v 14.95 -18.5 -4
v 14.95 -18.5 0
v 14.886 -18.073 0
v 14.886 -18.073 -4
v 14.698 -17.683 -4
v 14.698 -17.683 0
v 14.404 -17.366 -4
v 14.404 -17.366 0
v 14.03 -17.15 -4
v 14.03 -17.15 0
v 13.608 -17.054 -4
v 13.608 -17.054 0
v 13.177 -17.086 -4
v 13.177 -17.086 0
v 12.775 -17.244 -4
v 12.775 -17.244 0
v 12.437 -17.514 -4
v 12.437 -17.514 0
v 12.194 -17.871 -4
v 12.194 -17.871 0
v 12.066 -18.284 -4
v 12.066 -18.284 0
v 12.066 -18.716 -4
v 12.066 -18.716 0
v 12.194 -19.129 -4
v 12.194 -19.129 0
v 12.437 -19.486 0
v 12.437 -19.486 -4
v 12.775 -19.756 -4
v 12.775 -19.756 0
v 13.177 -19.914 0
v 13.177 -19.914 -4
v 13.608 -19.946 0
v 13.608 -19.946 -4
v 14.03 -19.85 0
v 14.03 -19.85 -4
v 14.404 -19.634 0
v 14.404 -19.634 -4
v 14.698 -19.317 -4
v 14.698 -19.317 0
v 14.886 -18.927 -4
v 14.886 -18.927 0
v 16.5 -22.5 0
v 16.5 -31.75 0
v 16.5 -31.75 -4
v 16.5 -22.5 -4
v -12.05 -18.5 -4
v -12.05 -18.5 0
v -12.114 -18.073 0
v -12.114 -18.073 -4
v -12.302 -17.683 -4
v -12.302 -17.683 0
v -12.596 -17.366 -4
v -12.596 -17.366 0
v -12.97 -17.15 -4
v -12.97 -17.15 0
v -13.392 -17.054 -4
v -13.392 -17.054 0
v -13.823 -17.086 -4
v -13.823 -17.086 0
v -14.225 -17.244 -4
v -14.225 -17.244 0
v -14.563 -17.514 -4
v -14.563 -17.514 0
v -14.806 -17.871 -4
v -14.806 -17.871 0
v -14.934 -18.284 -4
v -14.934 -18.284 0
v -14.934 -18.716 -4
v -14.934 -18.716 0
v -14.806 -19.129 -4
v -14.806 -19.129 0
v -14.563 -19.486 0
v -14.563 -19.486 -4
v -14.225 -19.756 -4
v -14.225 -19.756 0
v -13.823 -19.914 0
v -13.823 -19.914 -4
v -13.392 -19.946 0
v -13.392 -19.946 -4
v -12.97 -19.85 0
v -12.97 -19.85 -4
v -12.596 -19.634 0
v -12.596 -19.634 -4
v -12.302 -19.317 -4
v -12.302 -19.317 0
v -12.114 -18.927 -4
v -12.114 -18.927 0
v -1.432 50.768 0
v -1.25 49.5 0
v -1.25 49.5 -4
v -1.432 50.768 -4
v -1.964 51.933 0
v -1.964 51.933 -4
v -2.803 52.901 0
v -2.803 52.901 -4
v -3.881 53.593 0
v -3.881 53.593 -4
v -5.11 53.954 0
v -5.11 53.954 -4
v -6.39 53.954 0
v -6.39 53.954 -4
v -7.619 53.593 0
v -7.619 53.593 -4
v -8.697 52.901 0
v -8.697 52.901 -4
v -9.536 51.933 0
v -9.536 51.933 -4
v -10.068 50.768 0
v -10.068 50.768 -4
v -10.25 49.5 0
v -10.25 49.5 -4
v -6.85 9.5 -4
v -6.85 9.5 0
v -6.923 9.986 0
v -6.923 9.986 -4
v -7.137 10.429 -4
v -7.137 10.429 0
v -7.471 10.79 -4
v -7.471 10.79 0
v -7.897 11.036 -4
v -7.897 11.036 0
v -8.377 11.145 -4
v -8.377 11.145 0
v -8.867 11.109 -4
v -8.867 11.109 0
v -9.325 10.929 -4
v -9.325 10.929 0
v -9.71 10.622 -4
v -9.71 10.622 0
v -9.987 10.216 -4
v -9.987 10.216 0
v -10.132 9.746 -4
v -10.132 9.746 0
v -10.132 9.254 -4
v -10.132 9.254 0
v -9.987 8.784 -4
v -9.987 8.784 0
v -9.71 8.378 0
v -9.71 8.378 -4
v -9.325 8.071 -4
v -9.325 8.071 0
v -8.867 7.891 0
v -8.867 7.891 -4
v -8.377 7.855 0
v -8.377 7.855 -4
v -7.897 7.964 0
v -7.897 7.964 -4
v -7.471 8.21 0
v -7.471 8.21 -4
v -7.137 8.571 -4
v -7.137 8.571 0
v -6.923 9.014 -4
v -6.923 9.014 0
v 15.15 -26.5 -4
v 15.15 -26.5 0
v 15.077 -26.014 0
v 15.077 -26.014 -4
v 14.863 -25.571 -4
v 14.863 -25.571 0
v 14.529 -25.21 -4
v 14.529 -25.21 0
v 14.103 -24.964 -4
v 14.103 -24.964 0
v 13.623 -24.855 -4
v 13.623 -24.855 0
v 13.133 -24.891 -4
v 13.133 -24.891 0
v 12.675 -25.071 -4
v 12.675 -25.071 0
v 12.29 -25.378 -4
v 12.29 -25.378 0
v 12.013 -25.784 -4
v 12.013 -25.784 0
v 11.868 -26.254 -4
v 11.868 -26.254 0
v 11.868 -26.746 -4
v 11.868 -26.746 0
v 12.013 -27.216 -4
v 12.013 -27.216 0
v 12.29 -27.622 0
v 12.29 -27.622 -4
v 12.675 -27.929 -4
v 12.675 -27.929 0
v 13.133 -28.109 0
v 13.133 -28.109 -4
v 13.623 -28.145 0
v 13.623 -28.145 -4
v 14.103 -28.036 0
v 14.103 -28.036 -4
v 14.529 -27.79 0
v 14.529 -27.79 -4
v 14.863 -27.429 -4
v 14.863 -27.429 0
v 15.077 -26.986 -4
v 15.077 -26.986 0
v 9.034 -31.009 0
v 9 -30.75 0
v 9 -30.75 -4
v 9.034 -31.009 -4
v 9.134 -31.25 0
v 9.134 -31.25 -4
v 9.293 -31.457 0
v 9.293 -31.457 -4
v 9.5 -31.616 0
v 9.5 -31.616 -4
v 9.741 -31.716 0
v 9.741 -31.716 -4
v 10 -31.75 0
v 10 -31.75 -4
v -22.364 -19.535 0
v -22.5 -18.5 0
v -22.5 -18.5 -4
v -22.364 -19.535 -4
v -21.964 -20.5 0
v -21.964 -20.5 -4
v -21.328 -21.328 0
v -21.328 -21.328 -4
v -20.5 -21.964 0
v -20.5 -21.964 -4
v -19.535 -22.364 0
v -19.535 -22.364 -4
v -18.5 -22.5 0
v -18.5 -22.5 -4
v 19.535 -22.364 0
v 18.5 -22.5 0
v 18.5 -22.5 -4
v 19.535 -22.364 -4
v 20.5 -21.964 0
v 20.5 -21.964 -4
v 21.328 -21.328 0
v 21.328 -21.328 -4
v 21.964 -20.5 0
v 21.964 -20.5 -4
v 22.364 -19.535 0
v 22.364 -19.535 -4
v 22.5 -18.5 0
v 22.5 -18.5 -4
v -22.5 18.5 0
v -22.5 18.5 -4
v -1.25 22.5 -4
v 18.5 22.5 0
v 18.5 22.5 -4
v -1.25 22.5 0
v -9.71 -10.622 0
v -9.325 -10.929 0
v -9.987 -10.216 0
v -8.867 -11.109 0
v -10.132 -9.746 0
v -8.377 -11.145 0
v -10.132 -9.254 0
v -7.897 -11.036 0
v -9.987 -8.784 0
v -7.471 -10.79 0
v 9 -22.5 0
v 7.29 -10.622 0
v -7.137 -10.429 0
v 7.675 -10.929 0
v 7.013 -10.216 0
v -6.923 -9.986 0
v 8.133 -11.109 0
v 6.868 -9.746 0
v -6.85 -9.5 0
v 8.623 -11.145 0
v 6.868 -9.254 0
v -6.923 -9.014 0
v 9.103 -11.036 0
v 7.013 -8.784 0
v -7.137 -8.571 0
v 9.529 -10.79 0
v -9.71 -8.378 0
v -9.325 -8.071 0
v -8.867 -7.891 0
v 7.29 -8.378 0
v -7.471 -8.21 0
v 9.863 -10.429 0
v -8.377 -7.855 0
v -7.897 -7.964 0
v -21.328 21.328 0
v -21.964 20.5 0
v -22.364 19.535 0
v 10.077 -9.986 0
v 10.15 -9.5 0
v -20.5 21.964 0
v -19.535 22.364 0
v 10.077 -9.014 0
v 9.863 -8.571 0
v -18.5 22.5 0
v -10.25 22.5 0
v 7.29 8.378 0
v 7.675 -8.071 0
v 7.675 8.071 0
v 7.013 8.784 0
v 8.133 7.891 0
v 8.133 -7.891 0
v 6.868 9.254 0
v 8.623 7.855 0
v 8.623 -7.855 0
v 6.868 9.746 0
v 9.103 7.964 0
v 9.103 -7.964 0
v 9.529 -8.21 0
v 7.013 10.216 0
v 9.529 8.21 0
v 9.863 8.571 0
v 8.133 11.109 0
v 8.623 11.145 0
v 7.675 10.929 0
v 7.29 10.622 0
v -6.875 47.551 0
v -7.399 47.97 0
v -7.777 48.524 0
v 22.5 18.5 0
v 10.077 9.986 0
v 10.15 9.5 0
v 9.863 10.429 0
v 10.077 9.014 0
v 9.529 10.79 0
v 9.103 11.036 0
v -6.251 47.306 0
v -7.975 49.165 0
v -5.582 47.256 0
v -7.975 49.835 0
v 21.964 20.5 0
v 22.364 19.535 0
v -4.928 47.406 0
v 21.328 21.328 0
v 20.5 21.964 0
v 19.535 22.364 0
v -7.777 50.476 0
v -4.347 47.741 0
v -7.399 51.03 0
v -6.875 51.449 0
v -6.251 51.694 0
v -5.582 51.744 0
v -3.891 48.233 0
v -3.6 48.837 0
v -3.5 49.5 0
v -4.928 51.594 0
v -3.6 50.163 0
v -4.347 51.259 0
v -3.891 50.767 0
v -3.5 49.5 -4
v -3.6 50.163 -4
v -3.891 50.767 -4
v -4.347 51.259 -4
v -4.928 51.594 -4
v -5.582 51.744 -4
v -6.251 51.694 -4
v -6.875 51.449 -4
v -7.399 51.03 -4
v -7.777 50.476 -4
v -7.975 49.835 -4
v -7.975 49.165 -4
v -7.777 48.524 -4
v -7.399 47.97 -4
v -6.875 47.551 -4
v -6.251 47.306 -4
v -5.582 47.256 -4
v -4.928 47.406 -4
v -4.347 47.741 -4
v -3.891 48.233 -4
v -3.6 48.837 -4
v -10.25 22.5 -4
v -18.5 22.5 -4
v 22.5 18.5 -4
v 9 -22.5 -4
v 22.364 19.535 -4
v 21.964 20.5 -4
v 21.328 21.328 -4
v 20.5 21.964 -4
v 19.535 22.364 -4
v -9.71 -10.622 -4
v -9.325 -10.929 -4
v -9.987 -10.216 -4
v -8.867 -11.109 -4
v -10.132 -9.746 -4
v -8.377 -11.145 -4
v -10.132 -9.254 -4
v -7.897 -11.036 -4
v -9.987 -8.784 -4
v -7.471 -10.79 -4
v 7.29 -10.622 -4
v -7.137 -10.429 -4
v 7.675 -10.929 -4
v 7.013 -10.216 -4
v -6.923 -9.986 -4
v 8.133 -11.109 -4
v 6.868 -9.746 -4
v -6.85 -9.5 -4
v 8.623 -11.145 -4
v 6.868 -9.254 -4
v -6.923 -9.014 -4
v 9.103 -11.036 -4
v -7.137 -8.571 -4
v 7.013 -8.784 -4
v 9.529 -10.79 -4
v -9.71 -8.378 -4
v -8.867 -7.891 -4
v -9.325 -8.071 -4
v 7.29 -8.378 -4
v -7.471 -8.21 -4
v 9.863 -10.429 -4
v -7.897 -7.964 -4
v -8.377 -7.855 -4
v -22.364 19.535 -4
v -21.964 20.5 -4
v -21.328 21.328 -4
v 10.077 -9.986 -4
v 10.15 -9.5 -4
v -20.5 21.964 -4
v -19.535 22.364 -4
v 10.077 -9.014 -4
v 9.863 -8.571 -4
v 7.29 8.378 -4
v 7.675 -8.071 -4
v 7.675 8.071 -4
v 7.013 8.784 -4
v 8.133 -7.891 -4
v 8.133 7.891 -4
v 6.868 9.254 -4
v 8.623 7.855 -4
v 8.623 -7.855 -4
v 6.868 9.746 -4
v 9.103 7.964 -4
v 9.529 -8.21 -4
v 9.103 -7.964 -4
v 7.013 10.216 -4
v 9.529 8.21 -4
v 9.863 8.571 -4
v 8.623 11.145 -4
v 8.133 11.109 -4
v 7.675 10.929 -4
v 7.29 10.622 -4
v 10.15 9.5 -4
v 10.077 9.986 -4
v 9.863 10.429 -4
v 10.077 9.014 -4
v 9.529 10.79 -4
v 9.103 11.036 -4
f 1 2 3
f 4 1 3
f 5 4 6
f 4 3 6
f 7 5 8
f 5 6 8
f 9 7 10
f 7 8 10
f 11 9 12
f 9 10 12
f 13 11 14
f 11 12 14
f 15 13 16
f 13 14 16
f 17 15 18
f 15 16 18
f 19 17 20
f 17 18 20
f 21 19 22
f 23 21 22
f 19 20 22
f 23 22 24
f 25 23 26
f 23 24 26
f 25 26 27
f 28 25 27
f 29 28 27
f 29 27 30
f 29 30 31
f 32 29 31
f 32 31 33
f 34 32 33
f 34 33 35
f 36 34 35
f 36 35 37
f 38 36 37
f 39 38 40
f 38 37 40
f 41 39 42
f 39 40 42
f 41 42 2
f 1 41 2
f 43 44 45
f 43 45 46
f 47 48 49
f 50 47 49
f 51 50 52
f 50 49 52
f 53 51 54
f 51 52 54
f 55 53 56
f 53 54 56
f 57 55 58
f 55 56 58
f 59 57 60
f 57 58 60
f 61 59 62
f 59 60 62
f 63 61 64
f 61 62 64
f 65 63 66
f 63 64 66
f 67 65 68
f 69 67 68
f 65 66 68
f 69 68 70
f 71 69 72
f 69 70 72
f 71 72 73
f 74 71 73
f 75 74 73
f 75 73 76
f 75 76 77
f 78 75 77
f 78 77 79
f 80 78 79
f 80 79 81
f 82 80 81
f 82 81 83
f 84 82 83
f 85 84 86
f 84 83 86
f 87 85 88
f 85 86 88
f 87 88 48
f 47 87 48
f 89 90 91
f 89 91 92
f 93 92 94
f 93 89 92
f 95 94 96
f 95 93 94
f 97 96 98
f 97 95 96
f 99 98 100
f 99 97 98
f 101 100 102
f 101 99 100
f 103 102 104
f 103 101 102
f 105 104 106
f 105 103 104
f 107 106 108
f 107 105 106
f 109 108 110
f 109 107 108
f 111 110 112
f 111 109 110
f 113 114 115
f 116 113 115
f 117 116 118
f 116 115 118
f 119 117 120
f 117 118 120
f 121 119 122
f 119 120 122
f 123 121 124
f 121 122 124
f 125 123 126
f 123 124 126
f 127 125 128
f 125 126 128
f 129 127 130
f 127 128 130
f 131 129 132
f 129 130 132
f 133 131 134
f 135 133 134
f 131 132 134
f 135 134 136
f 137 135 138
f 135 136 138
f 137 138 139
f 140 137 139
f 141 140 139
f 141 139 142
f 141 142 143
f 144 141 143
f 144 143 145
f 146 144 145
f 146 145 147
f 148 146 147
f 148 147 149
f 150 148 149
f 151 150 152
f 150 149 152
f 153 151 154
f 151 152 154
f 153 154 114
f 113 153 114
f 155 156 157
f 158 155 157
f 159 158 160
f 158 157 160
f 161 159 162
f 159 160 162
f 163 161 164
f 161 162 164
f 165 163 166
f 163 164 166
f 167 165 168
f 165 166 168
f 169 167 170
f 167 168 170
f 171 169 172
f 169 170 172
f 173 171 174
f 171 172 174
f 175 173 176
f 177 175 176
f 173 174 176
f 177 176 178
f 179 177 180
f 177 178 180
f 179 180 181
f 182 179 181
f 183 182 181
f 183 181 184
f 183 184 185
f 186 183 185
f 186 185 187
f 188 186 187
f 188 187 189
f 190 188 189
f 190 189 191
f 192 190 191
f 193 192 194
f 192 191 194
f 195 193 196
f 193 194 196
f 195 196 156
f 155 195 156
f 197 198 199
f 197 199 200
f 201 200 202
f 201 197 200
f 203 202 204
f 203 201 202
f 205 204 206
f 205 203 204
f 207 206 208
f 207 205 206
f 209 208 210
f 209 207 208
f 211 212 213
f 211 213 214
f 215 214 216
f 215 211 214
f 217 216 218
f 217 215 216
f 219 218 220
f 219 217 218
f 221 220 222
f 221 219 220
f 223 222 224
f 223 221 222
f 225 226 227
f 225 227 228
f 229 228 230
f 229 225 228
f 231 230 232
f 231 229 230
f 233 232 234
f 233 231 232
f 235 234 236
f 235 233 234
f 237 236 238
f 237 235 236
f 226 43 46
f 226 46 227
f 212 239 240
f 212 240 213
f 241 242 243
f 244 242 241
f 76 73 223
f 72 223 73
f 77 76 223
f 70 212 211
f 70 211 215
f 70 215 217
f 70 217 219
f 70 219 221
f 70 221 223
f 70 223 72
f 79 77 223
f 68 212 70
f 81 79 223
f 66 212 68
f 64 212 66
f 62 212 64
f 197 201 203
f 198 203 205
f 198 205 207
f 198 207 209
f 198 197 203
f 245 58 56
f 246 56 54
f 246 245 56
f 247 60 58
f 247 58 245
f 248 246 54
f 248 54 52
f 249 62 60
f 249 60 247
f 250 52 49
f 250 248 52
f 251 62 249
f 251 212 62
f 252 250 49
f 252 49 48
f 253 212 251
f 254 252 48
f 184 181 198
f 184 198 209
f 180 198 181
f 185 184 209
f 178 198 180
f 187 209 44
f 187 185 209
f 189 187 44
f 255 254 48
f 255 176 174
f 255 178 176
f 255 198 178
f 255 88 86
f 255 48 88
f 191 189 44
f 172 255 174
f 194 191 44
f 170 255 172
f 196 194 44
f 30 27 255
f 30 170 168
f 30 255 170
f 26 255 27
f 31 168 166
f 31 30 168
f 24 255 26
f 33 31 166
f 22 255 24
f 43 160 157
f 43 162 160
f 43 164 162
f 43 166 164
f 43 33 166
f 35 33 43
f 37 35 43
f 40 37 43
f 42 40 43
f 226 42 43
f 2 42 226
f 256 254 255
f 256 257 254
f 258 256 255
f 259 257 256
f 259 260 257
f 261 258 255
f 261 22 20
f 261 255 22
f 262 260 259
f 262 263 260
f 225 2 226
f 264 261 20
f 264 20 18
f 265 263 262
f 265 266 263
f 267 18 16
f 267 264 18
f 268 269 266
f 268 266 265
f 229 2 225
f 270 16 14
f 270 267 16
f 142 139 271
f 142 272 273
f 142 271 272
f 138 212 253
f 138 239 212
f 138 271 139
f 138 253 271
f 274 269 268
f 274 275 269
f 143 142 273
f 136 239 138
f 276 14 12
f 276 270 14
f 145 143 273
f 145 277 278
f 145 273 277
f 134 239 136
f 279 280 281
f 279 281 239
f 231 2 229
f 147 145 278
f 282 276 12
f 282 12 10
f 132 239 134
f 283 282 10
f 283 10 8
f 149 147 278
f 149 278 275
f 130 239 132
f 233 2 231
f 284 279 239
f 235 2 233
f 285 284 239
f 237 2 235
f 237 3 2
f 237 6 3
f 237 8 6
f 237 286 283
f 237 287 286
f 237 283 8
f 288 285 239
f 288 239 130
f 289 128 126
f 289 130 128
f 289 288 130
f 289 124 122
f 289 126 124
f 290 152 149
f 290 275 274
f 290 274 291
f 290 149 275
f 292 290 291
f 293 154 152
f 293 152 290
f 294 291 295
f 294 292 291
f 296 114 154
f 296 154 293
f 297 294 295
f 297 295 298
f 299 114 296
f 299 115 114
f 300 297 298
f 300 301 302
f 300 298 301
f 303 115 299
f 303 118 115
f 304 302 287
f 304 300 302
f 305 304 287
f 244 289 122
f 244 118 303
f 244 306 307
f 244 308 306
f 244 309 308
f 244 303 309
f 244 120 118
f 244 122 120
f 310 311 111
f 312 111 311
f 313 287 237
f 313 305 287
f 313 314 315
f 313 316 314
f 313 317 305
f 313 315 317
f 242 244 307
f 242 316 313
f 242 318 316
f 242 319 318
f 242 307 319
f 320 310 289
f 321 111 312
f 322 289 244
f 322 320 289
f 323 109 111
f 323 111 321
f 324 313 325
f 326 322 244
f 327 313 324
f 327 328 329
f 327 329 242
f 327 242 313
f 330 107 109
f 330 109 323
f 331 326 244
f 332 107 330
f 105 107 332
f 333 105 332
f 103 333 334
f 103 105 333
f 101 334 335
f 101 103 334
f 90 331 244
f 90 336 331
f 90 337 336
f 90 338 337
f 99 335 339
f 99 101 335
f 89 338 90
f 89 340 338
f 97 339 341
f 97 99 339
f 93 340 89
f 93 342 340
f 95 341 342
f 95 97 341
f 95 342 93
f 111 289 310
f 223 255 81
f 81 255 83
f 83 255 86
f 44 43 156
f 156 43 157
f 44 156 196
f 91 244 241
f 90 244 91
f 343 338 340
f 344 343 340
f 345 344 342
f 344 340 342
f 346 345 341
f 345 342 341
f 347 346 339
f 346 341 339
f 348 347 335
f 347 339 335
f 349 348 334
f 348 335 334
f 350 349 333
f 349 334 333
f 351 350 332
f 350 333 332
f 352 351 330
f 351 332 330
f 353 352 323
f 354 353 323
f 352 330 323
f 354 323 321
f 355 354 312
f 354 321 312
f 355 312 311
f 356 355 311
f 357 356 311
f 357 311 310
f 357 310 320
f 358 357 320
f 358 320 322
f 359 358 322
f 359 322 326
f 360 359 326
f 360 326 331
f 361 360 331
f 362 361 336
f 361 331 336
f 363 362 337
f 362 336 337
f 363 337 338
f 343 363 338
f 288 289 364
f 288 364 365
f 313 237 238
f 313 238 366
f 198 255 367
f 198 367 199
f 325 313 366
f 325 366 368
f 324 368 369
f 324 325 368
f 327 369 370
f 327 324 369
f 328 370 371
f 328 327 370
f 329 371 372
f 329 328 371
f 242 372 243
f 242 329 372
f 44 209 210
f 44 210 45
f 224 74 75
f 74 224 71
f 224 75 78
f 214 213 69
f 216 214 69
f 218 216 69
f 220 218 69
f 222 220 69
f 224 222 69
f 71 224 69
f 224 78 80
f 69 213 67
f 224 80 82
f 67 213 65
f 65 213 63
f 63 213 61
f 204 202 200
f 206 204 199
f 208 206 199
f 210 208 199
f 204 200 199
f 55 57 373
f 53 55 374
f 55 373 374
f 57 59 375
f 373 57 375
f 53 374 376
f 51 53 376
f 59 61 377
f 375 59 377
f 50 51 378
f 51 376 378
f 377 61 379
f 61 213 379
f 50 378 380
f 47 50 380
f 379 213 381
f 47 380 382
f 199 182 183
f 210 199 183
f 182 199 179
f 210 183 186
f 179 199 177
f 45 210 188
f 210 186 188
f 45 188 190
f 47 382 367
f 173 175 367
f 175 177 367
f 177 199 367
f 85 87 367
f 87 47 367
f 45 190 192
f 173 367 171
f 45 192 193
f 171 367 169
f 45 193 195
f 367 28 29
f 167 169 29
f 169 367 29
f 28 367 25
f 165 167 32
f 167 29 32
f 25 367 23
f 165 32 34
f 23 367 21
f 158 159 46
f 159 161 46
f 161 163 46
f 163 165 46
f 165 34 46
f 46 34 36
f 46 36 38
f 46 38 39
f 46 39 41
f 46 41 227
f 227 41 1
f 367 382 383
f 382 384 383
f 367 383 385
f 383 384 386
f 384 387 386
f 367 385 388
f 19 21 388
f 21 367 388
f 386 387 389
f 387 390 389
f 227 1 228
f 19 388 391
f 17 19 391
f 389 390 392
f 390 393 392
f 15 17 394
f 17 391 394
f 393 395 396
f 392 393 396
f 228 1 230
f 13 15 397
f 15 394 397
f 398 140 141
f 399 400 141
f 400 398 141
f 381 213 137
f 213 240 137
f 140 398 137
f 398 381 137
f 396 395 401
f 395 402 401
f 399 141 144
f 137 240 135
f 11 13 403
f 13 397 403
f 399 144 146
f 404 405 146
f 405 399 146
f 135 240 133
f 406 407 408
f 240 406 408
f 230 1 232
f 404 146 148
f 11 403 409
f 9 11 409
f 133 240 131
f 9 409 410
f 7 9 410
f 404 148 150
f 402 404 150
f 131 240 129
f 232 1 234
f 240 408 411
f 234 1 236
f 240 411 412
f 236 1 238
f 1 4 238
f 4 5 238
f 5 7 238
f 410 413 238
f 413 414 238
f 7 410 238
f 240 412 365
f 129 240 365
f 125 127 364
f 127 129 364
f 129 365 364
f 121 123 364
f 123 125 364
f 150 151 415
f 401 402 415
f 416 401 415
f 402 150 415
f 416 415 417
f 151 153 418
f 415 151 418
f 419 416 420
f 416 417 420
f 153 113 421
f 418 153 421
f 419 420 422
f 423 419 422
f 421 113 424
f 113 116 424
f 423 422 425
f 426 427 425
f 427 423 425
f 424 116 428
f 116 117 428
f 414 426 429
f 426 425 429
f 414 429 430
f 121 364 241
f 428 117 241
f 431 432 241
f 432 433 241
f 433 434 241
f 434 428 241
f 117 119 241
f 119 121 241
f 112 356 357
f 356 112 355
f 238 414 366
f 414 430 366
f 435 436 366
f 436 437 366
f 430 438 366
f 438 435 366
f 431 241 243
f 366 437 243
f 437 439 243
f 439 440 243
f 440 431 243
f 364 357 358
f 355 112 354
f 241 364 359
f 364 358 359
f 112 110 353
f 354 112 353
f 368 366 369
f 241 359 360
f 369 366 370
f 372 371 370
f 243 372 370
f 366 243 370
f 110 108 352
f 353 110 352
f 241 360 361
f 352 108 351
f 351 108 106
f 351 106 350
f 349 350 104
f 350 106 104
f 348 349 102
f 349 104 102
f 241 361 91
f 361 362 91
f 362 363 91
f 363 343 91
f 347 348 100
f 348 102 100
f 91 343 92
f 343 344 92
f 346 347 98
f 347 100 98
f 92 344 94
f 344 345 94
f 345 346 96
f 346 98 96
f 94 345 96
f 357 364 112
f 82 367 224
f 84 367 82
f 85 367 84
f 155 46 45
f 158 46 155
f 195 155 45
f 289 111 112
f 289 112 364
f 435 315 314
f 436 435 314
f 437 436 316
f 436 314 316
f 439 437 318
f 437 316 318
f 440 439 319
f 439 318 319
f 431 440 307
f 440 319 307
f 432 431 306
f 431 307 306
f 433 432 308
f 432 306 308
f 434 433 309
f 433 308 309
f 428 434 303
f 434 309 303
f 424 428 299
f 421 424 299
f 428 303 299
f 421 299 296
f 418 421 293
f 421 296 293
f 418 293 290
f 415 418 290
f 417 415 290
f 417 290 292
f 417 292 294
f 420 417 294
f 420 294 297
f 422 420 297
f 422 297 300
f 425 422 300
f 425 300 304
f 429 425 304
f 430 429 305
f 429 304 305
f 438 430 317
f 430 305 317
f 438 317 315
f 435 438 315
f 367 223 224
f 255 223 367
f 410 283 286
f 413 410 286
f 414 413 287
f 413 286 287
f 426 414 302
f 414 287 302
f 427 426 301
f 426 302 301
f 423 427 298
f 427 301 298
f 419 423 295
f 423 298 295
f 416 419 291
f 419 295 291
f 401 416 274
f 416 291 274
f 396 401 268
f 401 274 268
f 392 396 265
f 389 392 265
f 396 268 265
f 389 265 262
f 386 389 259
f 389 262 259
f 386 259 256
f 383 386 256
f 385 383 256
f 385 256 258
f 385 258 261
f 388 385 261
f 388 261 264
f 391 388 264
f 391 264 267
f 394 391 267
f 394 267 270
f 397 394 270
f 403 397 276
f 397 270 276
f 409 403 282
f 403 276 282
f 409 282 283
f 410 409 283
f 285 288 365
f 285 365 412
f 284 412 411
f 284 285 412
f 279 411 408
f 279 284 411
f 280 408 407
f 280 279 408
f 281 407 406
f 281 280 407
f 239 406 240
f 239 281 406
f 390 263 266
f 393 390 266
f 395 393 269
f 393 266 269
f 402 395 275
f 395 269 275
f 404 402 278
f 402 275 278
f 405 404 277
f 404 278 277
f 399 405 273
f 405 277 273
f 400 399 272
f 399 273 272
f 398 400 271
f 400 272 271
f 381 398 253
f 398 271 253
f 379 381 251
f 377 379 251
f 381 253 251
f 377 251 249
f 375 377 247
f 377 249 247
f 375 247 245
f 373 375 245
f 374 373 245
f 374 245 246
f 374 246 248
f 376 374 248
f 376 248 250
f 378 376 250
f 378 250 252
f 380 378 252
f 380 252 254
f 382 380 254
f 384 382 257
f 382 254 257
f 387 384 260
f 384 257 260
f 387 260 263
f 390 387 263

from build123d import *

# Parameters (mm, degrees)
F0_R     = 1.45
F0_R_2   = 1.65
F0_R_3   = 2.25
F1_DEPTH = 4


with BuildPart() as f1:
    # F0 (on Top) → F1 (new body)
    with BuildSketch(Plane.XY):
        with BuildLine():
            Line((-1.25, 22.5), (-1.25, 49.5))
            ThreePointArc((-1.25, 49.5), (-5.75, 54), (-10.25, 49.5))
            Line((-10.25, 49.5), (-10.25, 22.5))
            Line((-10.25, 22.5), (-18.5, 22.5))
            ThreePointArc((-18.5, 22.5), (-21.328427, 21.328427), (-22.5, 18.5))
            Line((-22.5, 18.5), (-22.5, -18.5))
            ThreePointArc((-22.5, -18.5), (-21.328427, -21.328427), (-18.5, -22.5))
            Line((-18.5, -22.5), (9, -22.5))
            Line((9, -22.5), (9, -30.75))
            ThreePointArc((9, -30.75), (9.292893, -31.457107), (10, -31.75))
            Line((10, -31.75), (16.5, -31.75))
            Line((16.5, -31.75), (16.5, -22.5))
            Line((16.5, -22.5), (18.5, -22.5))
            ThreePointArc((18.5, -22.5), (21.328427, -21.328427), (22.5, -18.5))
            Line((22.5, -18.5), (22.5, 18.5))
            ThreePointArc((22.5, 18.5), (21.328427, 21.328427), (18.5, 22.5))
            Line((18.5, 22.5), (-1.25, 22.5))
        make_face()
        with Locations((-13.5, -18.5)):
            Circle(F0_R, mode=Mode.SUBTRACT)
        with Locations((-8.5, -9.5)):
            Circle(F0_R_2, mode=Mode.SUBTRACT)
        with Locations((-8.5, 9.5)):
            Circle(F0_R_2, mode=Mode.SUBTRACT)
        with Locations((13.5, -26.5)):
            Circle(F0_R_2, mode=Mode.SUBTRACT)
        with Locations((13.5, -18.5)):
            Circle(F0_R, mode=Mode.SUBTRACT)
        with Locations((8.5, -9.5)):
            Circle(F0_R_2, mode=Mode.SUBTRACT)
        with Locations((8.5, 9.5)):
            Circle(F0_R_2, mode=Mode.SUBTRACT)
        with Locations((-5.75, 49.5)):
            Circle(F0_R_3, mode=Mode.SUBTRACT)
    extrude(amount=-F1_DEPTH)


solid = f1.part
